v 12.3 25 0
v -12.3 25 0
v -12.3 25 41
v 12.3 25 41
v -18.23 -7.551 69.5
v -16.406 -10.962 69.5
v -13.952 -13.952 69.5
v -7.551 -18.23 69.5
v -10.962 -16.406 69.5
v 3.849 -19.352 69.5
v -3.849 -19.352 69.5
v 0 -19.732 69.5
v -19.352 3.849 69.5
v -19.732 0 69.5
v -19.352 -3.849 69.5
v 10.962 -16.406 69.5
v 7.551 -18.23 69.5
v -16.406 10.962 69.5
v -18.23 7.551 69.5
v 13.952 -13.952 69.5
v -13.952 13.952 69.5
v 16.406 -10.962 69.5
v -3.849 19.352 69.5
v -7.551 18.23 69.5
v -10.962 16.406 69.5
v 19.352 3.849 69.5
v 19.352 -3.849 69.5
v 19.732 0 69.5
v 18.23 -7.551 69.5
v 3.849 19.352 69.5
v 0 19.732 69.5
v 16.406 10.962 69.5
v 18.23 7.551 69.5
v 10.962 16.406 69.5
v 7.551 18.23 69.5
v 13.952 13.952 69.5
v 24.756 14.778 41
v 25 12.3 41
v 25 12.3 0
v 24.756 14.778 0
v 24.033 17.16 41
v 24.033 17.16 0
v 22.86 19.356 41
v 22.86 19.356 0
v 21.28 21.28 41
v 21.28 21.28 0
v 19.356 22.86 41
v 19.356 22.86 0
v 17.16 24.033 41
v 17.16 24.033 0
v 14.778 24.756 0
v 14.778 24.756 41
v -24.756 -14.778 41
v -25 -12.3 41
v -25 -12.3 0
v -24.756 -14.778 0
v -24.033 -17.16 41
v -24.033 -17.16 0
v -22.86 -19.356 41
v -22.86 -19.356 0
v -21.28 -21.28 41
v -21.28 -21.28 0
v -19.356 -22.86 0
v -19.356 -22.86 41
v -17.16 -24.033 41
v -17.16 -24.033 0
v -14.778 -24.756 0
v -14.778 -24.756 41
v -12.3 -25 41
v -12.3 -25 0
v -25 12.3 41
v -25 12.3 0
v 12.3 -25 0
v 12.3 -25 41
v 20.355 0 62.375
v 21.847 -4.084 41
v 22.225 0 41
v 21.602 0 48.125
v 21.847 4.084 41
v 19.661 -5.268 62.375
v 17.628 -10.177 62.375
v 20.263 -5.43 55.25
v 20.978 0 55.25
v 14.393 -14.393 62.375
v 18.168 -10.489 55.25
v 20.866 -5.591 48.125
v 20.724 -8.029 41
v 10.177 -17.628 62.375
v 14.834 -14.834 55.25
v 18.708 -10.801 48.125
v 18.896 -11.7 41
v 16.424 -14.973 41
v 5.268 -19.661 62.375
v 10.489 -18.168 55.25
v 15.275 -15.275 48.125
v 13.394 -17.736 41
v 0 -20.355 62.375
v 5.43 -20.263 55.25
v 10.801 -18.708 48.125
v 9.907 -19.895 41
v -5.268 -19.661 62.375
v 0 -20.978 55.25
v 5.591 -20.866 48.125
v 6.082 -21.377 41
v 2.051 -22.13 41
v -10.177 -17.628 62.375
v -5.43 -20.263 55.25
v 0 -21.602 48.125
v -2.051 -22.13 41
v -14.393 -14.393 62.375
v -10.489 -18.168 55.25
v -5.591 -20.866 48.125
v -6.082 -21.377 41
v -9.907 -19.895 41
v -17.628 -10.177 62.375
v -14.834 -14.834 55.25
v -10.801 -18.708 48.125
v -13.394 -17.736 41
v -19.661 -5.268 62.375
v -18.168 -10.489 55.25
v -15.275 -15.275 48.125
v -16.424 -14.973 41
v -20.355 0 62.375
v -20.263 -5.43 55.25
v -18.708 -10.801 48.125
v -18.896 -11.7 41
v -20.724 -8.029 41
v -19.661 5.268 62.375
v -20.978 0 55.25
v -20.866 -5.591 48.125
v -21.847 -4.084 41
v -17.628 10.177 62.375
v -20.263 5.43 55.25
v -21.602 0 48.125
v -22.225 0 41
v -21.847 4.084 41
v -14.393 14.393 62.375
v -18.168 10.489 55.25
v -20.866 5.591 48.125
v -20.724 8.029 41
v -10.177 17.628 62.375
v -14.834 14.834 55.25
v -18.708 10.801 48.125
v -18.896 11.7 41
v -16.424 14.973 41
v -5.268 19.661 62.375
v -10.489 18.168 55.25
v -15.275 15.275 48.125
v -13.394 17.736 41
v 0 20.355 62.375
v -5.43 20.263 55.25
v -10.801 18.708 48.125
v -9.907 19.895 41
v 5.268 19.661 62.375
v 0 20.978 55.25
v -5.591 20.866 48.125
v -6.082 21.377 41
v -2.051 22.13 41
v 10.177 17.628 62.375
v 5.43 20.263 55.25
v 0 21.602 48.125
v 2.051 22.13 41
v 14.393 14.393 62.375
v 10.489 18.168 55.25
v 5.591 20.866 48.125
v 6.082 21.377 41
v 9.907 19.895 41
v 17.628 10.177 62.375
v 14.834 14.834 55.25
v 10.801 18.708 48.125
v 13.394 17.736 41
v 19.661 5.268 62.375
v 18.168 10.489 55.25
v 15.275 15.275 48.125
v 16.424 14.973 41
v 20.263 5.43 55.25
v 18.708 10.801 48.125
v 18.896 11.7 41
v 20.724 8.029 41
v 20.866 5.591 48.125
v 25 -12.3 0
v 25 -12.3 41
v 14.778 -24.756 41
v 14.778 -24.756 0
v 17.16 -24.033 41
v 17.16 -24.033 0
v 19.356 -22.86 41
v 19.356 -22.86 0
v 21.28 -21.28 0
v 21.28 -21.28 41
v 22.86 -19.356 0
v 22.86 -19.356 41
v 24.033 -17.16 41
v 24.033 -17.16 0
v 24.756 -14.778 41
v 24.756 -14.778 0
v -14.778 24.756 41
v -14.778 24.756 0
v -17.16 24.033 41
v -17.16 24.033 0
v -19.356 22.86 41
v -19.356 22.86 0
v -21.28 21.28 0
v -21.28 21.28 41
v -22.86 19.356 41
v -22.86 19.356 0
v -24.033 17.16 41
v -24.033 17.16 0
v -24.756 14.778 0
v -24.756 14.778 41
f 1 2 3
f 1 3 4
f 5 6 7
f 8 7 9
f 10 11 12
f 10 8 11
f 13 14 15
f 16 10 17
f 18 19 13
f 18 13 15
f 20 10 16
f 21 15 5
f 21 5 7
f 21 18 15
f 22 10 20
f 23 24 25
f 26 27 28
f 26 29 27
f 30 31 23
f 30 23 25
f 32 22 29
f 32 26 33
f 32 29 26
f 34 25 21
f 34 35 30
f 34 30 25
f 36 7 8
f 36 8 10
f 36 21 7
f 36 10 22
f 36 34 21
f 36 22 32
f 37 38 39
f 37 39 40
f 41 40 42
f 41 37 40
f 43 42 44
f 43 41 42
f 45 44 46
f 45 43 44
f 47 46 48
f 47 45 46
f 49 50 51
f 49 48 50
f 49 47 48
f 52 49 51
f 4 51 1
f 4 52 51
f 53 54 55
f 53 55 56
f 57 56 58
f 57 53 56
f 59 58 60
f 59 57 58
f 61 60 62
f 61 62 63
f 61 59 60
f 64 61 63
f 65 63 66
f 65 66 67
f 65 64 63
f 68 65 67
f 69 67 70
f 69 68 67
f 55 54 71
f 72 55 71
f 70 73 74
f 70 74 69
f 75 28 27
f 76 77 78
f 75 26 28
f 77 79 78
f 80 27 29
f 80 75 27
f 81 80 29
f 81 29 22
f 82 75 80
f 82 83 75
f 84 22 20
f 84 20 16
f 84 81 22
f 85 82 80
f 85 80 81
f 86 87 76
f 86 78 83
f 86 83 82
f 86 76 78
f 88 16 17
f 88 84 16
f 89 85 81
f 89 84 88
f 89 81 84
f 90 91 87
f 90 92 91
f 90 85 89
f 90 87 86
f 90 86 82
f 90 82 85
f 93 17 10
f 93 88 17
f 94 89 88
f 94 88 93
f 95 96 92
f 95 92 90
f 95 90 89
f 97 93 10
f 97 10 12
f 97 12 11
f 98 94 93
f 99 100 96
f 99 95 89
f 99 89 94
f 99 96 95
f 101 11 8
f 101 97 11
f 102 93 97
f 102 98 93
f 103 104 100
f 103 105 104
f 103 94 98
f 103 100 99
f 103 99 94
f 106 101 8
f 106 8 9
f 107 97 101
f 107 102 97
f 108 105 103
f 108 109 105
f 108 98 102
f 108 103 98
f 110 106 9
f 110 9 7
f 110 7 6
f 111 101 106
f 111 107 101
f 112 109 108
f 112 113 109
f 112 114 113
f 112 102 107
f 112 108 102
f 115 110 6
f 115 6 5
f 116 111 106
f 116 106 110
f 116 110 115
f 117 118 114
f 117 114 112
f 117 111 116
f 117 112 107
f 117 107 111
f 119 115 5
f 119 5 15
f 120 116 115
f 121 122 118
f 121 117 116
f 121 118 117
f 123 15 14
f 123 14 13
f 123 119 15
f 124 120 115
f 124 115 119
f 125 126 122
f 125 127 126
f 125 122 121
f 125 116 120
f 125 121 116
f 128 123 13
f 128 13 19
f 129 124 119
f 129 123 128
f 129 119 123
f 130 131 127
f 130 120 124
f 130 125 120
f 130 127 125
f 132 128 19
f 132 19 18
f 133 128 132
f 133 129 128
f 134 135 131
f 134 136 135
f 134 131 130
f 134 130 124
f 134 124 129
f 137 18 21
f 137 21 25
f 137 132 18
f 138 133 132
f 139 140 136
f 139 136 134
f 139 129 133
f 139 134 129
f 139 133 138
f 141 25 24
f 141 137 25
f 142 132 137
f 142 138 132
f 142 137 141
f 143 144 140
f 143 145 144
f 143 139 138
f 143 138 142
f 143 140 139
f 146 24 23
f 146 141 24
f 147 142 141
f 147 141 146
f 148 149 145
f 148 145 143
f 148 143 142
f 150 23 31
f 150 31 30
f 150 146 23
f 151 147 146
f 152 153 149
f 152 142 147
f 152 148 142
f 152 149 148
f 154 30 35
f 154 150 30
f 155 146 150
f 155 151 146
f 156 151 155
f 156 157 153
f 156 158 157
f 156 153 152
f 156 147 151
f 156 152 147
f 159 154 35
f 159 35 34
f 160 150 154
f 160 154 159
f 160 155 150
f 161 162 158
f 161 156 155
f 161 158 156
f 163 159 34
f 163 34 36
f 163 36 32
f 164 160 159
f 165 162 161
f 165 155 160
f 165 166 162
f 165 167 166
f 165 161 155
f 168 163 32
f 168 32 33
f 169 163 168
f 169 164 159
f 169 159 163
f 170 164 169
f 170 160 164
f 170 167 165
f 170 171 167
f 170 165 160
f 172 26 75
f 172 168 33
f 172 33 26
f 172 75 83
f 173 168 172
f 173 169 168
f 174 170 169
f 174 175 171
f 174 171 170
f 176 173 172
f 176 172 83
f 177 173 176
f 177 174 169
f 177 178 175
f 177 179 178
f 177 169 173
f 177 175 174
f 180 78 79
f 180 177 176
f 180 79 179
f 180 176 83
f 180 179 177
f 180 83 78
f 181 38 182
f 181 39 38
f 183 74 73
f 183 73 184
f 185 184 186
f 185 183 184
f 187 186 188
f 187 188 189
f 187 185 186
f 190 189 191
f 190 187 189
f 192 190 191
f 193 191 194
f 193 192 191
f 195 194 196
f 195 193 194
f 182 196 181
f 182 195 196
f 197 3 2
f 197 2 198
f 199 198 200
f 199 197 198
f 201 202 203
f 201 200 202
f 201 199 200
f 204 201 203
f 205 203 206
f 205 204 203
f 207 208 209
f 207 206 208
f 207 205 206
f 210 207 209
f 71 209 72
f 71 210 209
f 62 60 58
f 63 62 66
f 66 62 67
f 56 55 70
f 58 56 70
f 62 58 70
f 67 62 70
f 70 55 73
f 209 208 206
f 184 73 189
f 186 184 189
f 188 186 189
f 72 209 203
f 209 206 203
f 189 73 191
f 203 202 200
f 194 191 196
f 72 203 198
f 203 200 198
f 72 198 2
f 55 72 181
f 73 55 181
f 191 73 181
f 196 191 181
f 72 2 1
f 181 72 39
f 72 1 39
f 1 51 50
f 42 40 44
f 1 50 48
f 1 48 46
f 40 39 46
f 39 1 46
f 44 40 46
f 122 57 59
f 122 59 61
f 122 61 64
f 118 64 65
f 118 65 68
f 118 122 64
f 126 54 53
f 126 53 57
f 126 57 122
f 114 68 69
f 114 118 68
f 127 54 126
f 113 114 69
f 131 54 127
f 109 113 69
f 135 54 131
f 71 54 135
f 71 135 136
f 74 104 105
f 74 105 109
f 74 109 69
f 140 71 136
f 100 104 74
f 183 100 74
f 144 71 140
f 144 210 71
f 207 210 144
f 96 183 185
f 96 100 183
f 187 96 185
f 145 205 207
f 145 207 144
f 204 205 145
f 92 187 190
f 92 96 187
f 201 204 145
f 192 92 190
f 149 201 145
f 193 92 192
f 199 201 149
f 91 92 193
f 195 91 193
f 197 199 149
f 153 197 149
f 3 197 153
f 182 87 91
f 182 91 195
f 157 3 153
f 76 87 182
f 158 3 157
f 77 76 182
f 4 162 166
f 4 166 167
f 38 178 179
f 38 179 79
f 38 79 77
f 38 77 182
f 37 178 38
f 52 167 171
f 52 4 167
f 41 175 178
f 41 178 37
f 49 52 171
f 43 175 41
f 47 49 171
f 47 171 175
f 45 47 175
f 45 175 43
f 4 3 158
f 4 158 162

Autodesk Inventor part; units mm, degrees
ref_plane "YZ Plane" through (0, 0, 0) normal (1, 0, 0) x (0, 1, 0)
ref_plane "XZ Plane" through (0, 0, 0) normal (0, 1, 0) x (-1, 0, 0)
ref_plane "XY Plane" through (0, 0, 0) normal (0, 0, 1) x (1, 0, 0)
sketch "Sketch1" plane through (0, 0, 0) normal (0, 0, 1) x (1, 0, 0)
  line L0 (-35, 0) -> (35, 0) projected
  line L1 (0, -35) -> (0, 35) projected
  line L2 (-25, 25) -> (25, 25)
  line L3 (25, 25) -> (25, -25)
  line L4 (25, -25) -> (-25, -25)
  line L5 (-25, -25) -> (-25, 25)
  point P0 (0, 0)
  point P1 (-25, 0)
  point P2 (0, 25)
  dimension "d0" = 50
extrude "Extrusion1" add sketch "Sketch1" along normal blind 41
sketch "Sketch2" plane through (0, 0, 41) normal (0, 0, 1) x (1, 0, 0)
  circle A0 centre (0, 0) radius 22.225
  dimension "d3" = 44.45
extrude "Extrusion2" add sketch "Sketch2" along normal blind 28.5 draft -5
fillet "Fillet1" radius 12.7 4 edges at (25, 25, 20.5) (25, -25, 20.5) (-25, 25, 20.5) (-25, -25, 20.5)
properties part number "rangefinder model"
